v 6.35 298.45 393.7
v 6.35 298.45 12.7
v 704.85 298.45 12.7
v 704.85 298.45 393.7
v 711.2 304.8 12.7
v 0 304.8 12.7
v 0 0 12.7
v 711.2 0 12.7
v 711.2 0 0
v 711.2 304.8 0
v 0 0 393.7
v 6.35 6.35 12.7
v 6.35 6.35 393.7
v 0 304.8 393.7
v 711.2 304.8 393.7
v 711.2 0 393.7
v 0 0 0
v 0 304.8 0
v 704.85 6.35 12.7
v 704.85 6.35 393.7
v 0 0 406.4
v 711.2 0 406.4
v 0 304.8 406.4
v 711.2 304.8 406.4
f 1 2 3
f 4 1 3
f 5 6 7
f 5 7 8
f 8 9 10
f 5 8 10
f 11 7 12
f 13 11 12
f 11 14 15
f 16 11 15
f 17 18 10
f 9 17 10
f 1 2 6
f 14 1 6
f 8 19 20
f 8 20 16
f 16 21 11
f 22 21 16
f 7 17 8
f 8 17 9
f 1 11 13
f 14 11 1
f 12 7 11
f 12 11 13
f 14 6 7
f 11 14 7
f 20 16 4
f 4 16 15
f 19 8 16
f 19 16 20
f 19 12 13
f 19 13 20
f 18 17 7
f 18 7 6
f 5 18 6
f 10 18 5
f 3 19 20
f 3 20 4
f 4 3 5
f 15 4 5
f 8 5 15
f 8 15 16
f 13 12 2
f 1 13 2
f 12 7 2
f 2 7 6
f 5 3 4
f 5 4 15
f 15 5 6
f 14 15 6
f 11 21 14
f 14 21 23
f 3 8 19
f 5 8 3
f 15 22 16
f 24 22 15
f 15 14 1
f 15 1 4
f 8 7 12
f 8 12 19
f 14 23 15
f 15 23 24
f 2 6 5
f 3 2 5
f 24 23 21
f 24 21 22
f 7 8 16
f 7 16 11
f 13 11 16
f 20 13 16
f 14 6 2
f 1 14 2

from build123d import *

# Parameters (mm, degrees)
F1_W     = 711.2
F1_H     = 304.8
F2_DEPTH = 12.7
F3_W     = 711.2
F3_H     = 304.8
F4_DEPTH = 12.7
F6_DEPTH = 381
F8_DEPTH = 381


with BuildPart() as f2:
    # F1 (on Top) → F2 (new body)
    with BuildSketch(Plane.XY):
        with Locations((355.6, 152.4)):
            Rectangle(F1_W, F1_H)
    extrude(amount=F2_DEPTH)


with BuildPart() as f4:
    # F3 (on offset) → F4 (new body)
    with BuildSketch(Plane.XY.offset(406.4)):
        with Locations((355.6, 152.4)):
            Rectangle(F3_W, F3_H)
    extrude(amount=-F4_DEPTH)


with BuildPart() as f6:
    # F5 (on face) → F6 (new body, through all)
    with BuildSketch(Plane.XY.offset(12.7)):
        Polygon((711.2, 304.8), (0, 304.8), (6.35, 298.45), (704.85, 298.45), align=None)
    extrude(amount=F6_DEPTH)


with BuildPart() as f8:
    # F7 (on face) → F8 (new body, through all)
    with BuildSketch(Plane.XY.offset(12.7)):
        Polygon((6.35, 298.45), (0, 304.8), (0, 0), (6.35, 6.35), align=None)
    extrude(amount=F8_DEPTH)


with BuildPart() as f11_1:
    # F11: instance of F8
    add(f8.part.mirror(Plane(origin=(355.6, 152.4, 6.35), x_dir=(0, 1, 0), z_dir=(1, 0, 0))))


with BuildPart() as f12_1:
    # F12: instance of F6
    add(f6.part.mirror(Plane(origin=(355.6, 152.4, 6.35), x_dir=(1, 0, 0), z_dir=(0, -1, 0))))


solid = Compound([f2.part, f4.part, f6.part, f8.part, f11_1.part, f12_1.part])
